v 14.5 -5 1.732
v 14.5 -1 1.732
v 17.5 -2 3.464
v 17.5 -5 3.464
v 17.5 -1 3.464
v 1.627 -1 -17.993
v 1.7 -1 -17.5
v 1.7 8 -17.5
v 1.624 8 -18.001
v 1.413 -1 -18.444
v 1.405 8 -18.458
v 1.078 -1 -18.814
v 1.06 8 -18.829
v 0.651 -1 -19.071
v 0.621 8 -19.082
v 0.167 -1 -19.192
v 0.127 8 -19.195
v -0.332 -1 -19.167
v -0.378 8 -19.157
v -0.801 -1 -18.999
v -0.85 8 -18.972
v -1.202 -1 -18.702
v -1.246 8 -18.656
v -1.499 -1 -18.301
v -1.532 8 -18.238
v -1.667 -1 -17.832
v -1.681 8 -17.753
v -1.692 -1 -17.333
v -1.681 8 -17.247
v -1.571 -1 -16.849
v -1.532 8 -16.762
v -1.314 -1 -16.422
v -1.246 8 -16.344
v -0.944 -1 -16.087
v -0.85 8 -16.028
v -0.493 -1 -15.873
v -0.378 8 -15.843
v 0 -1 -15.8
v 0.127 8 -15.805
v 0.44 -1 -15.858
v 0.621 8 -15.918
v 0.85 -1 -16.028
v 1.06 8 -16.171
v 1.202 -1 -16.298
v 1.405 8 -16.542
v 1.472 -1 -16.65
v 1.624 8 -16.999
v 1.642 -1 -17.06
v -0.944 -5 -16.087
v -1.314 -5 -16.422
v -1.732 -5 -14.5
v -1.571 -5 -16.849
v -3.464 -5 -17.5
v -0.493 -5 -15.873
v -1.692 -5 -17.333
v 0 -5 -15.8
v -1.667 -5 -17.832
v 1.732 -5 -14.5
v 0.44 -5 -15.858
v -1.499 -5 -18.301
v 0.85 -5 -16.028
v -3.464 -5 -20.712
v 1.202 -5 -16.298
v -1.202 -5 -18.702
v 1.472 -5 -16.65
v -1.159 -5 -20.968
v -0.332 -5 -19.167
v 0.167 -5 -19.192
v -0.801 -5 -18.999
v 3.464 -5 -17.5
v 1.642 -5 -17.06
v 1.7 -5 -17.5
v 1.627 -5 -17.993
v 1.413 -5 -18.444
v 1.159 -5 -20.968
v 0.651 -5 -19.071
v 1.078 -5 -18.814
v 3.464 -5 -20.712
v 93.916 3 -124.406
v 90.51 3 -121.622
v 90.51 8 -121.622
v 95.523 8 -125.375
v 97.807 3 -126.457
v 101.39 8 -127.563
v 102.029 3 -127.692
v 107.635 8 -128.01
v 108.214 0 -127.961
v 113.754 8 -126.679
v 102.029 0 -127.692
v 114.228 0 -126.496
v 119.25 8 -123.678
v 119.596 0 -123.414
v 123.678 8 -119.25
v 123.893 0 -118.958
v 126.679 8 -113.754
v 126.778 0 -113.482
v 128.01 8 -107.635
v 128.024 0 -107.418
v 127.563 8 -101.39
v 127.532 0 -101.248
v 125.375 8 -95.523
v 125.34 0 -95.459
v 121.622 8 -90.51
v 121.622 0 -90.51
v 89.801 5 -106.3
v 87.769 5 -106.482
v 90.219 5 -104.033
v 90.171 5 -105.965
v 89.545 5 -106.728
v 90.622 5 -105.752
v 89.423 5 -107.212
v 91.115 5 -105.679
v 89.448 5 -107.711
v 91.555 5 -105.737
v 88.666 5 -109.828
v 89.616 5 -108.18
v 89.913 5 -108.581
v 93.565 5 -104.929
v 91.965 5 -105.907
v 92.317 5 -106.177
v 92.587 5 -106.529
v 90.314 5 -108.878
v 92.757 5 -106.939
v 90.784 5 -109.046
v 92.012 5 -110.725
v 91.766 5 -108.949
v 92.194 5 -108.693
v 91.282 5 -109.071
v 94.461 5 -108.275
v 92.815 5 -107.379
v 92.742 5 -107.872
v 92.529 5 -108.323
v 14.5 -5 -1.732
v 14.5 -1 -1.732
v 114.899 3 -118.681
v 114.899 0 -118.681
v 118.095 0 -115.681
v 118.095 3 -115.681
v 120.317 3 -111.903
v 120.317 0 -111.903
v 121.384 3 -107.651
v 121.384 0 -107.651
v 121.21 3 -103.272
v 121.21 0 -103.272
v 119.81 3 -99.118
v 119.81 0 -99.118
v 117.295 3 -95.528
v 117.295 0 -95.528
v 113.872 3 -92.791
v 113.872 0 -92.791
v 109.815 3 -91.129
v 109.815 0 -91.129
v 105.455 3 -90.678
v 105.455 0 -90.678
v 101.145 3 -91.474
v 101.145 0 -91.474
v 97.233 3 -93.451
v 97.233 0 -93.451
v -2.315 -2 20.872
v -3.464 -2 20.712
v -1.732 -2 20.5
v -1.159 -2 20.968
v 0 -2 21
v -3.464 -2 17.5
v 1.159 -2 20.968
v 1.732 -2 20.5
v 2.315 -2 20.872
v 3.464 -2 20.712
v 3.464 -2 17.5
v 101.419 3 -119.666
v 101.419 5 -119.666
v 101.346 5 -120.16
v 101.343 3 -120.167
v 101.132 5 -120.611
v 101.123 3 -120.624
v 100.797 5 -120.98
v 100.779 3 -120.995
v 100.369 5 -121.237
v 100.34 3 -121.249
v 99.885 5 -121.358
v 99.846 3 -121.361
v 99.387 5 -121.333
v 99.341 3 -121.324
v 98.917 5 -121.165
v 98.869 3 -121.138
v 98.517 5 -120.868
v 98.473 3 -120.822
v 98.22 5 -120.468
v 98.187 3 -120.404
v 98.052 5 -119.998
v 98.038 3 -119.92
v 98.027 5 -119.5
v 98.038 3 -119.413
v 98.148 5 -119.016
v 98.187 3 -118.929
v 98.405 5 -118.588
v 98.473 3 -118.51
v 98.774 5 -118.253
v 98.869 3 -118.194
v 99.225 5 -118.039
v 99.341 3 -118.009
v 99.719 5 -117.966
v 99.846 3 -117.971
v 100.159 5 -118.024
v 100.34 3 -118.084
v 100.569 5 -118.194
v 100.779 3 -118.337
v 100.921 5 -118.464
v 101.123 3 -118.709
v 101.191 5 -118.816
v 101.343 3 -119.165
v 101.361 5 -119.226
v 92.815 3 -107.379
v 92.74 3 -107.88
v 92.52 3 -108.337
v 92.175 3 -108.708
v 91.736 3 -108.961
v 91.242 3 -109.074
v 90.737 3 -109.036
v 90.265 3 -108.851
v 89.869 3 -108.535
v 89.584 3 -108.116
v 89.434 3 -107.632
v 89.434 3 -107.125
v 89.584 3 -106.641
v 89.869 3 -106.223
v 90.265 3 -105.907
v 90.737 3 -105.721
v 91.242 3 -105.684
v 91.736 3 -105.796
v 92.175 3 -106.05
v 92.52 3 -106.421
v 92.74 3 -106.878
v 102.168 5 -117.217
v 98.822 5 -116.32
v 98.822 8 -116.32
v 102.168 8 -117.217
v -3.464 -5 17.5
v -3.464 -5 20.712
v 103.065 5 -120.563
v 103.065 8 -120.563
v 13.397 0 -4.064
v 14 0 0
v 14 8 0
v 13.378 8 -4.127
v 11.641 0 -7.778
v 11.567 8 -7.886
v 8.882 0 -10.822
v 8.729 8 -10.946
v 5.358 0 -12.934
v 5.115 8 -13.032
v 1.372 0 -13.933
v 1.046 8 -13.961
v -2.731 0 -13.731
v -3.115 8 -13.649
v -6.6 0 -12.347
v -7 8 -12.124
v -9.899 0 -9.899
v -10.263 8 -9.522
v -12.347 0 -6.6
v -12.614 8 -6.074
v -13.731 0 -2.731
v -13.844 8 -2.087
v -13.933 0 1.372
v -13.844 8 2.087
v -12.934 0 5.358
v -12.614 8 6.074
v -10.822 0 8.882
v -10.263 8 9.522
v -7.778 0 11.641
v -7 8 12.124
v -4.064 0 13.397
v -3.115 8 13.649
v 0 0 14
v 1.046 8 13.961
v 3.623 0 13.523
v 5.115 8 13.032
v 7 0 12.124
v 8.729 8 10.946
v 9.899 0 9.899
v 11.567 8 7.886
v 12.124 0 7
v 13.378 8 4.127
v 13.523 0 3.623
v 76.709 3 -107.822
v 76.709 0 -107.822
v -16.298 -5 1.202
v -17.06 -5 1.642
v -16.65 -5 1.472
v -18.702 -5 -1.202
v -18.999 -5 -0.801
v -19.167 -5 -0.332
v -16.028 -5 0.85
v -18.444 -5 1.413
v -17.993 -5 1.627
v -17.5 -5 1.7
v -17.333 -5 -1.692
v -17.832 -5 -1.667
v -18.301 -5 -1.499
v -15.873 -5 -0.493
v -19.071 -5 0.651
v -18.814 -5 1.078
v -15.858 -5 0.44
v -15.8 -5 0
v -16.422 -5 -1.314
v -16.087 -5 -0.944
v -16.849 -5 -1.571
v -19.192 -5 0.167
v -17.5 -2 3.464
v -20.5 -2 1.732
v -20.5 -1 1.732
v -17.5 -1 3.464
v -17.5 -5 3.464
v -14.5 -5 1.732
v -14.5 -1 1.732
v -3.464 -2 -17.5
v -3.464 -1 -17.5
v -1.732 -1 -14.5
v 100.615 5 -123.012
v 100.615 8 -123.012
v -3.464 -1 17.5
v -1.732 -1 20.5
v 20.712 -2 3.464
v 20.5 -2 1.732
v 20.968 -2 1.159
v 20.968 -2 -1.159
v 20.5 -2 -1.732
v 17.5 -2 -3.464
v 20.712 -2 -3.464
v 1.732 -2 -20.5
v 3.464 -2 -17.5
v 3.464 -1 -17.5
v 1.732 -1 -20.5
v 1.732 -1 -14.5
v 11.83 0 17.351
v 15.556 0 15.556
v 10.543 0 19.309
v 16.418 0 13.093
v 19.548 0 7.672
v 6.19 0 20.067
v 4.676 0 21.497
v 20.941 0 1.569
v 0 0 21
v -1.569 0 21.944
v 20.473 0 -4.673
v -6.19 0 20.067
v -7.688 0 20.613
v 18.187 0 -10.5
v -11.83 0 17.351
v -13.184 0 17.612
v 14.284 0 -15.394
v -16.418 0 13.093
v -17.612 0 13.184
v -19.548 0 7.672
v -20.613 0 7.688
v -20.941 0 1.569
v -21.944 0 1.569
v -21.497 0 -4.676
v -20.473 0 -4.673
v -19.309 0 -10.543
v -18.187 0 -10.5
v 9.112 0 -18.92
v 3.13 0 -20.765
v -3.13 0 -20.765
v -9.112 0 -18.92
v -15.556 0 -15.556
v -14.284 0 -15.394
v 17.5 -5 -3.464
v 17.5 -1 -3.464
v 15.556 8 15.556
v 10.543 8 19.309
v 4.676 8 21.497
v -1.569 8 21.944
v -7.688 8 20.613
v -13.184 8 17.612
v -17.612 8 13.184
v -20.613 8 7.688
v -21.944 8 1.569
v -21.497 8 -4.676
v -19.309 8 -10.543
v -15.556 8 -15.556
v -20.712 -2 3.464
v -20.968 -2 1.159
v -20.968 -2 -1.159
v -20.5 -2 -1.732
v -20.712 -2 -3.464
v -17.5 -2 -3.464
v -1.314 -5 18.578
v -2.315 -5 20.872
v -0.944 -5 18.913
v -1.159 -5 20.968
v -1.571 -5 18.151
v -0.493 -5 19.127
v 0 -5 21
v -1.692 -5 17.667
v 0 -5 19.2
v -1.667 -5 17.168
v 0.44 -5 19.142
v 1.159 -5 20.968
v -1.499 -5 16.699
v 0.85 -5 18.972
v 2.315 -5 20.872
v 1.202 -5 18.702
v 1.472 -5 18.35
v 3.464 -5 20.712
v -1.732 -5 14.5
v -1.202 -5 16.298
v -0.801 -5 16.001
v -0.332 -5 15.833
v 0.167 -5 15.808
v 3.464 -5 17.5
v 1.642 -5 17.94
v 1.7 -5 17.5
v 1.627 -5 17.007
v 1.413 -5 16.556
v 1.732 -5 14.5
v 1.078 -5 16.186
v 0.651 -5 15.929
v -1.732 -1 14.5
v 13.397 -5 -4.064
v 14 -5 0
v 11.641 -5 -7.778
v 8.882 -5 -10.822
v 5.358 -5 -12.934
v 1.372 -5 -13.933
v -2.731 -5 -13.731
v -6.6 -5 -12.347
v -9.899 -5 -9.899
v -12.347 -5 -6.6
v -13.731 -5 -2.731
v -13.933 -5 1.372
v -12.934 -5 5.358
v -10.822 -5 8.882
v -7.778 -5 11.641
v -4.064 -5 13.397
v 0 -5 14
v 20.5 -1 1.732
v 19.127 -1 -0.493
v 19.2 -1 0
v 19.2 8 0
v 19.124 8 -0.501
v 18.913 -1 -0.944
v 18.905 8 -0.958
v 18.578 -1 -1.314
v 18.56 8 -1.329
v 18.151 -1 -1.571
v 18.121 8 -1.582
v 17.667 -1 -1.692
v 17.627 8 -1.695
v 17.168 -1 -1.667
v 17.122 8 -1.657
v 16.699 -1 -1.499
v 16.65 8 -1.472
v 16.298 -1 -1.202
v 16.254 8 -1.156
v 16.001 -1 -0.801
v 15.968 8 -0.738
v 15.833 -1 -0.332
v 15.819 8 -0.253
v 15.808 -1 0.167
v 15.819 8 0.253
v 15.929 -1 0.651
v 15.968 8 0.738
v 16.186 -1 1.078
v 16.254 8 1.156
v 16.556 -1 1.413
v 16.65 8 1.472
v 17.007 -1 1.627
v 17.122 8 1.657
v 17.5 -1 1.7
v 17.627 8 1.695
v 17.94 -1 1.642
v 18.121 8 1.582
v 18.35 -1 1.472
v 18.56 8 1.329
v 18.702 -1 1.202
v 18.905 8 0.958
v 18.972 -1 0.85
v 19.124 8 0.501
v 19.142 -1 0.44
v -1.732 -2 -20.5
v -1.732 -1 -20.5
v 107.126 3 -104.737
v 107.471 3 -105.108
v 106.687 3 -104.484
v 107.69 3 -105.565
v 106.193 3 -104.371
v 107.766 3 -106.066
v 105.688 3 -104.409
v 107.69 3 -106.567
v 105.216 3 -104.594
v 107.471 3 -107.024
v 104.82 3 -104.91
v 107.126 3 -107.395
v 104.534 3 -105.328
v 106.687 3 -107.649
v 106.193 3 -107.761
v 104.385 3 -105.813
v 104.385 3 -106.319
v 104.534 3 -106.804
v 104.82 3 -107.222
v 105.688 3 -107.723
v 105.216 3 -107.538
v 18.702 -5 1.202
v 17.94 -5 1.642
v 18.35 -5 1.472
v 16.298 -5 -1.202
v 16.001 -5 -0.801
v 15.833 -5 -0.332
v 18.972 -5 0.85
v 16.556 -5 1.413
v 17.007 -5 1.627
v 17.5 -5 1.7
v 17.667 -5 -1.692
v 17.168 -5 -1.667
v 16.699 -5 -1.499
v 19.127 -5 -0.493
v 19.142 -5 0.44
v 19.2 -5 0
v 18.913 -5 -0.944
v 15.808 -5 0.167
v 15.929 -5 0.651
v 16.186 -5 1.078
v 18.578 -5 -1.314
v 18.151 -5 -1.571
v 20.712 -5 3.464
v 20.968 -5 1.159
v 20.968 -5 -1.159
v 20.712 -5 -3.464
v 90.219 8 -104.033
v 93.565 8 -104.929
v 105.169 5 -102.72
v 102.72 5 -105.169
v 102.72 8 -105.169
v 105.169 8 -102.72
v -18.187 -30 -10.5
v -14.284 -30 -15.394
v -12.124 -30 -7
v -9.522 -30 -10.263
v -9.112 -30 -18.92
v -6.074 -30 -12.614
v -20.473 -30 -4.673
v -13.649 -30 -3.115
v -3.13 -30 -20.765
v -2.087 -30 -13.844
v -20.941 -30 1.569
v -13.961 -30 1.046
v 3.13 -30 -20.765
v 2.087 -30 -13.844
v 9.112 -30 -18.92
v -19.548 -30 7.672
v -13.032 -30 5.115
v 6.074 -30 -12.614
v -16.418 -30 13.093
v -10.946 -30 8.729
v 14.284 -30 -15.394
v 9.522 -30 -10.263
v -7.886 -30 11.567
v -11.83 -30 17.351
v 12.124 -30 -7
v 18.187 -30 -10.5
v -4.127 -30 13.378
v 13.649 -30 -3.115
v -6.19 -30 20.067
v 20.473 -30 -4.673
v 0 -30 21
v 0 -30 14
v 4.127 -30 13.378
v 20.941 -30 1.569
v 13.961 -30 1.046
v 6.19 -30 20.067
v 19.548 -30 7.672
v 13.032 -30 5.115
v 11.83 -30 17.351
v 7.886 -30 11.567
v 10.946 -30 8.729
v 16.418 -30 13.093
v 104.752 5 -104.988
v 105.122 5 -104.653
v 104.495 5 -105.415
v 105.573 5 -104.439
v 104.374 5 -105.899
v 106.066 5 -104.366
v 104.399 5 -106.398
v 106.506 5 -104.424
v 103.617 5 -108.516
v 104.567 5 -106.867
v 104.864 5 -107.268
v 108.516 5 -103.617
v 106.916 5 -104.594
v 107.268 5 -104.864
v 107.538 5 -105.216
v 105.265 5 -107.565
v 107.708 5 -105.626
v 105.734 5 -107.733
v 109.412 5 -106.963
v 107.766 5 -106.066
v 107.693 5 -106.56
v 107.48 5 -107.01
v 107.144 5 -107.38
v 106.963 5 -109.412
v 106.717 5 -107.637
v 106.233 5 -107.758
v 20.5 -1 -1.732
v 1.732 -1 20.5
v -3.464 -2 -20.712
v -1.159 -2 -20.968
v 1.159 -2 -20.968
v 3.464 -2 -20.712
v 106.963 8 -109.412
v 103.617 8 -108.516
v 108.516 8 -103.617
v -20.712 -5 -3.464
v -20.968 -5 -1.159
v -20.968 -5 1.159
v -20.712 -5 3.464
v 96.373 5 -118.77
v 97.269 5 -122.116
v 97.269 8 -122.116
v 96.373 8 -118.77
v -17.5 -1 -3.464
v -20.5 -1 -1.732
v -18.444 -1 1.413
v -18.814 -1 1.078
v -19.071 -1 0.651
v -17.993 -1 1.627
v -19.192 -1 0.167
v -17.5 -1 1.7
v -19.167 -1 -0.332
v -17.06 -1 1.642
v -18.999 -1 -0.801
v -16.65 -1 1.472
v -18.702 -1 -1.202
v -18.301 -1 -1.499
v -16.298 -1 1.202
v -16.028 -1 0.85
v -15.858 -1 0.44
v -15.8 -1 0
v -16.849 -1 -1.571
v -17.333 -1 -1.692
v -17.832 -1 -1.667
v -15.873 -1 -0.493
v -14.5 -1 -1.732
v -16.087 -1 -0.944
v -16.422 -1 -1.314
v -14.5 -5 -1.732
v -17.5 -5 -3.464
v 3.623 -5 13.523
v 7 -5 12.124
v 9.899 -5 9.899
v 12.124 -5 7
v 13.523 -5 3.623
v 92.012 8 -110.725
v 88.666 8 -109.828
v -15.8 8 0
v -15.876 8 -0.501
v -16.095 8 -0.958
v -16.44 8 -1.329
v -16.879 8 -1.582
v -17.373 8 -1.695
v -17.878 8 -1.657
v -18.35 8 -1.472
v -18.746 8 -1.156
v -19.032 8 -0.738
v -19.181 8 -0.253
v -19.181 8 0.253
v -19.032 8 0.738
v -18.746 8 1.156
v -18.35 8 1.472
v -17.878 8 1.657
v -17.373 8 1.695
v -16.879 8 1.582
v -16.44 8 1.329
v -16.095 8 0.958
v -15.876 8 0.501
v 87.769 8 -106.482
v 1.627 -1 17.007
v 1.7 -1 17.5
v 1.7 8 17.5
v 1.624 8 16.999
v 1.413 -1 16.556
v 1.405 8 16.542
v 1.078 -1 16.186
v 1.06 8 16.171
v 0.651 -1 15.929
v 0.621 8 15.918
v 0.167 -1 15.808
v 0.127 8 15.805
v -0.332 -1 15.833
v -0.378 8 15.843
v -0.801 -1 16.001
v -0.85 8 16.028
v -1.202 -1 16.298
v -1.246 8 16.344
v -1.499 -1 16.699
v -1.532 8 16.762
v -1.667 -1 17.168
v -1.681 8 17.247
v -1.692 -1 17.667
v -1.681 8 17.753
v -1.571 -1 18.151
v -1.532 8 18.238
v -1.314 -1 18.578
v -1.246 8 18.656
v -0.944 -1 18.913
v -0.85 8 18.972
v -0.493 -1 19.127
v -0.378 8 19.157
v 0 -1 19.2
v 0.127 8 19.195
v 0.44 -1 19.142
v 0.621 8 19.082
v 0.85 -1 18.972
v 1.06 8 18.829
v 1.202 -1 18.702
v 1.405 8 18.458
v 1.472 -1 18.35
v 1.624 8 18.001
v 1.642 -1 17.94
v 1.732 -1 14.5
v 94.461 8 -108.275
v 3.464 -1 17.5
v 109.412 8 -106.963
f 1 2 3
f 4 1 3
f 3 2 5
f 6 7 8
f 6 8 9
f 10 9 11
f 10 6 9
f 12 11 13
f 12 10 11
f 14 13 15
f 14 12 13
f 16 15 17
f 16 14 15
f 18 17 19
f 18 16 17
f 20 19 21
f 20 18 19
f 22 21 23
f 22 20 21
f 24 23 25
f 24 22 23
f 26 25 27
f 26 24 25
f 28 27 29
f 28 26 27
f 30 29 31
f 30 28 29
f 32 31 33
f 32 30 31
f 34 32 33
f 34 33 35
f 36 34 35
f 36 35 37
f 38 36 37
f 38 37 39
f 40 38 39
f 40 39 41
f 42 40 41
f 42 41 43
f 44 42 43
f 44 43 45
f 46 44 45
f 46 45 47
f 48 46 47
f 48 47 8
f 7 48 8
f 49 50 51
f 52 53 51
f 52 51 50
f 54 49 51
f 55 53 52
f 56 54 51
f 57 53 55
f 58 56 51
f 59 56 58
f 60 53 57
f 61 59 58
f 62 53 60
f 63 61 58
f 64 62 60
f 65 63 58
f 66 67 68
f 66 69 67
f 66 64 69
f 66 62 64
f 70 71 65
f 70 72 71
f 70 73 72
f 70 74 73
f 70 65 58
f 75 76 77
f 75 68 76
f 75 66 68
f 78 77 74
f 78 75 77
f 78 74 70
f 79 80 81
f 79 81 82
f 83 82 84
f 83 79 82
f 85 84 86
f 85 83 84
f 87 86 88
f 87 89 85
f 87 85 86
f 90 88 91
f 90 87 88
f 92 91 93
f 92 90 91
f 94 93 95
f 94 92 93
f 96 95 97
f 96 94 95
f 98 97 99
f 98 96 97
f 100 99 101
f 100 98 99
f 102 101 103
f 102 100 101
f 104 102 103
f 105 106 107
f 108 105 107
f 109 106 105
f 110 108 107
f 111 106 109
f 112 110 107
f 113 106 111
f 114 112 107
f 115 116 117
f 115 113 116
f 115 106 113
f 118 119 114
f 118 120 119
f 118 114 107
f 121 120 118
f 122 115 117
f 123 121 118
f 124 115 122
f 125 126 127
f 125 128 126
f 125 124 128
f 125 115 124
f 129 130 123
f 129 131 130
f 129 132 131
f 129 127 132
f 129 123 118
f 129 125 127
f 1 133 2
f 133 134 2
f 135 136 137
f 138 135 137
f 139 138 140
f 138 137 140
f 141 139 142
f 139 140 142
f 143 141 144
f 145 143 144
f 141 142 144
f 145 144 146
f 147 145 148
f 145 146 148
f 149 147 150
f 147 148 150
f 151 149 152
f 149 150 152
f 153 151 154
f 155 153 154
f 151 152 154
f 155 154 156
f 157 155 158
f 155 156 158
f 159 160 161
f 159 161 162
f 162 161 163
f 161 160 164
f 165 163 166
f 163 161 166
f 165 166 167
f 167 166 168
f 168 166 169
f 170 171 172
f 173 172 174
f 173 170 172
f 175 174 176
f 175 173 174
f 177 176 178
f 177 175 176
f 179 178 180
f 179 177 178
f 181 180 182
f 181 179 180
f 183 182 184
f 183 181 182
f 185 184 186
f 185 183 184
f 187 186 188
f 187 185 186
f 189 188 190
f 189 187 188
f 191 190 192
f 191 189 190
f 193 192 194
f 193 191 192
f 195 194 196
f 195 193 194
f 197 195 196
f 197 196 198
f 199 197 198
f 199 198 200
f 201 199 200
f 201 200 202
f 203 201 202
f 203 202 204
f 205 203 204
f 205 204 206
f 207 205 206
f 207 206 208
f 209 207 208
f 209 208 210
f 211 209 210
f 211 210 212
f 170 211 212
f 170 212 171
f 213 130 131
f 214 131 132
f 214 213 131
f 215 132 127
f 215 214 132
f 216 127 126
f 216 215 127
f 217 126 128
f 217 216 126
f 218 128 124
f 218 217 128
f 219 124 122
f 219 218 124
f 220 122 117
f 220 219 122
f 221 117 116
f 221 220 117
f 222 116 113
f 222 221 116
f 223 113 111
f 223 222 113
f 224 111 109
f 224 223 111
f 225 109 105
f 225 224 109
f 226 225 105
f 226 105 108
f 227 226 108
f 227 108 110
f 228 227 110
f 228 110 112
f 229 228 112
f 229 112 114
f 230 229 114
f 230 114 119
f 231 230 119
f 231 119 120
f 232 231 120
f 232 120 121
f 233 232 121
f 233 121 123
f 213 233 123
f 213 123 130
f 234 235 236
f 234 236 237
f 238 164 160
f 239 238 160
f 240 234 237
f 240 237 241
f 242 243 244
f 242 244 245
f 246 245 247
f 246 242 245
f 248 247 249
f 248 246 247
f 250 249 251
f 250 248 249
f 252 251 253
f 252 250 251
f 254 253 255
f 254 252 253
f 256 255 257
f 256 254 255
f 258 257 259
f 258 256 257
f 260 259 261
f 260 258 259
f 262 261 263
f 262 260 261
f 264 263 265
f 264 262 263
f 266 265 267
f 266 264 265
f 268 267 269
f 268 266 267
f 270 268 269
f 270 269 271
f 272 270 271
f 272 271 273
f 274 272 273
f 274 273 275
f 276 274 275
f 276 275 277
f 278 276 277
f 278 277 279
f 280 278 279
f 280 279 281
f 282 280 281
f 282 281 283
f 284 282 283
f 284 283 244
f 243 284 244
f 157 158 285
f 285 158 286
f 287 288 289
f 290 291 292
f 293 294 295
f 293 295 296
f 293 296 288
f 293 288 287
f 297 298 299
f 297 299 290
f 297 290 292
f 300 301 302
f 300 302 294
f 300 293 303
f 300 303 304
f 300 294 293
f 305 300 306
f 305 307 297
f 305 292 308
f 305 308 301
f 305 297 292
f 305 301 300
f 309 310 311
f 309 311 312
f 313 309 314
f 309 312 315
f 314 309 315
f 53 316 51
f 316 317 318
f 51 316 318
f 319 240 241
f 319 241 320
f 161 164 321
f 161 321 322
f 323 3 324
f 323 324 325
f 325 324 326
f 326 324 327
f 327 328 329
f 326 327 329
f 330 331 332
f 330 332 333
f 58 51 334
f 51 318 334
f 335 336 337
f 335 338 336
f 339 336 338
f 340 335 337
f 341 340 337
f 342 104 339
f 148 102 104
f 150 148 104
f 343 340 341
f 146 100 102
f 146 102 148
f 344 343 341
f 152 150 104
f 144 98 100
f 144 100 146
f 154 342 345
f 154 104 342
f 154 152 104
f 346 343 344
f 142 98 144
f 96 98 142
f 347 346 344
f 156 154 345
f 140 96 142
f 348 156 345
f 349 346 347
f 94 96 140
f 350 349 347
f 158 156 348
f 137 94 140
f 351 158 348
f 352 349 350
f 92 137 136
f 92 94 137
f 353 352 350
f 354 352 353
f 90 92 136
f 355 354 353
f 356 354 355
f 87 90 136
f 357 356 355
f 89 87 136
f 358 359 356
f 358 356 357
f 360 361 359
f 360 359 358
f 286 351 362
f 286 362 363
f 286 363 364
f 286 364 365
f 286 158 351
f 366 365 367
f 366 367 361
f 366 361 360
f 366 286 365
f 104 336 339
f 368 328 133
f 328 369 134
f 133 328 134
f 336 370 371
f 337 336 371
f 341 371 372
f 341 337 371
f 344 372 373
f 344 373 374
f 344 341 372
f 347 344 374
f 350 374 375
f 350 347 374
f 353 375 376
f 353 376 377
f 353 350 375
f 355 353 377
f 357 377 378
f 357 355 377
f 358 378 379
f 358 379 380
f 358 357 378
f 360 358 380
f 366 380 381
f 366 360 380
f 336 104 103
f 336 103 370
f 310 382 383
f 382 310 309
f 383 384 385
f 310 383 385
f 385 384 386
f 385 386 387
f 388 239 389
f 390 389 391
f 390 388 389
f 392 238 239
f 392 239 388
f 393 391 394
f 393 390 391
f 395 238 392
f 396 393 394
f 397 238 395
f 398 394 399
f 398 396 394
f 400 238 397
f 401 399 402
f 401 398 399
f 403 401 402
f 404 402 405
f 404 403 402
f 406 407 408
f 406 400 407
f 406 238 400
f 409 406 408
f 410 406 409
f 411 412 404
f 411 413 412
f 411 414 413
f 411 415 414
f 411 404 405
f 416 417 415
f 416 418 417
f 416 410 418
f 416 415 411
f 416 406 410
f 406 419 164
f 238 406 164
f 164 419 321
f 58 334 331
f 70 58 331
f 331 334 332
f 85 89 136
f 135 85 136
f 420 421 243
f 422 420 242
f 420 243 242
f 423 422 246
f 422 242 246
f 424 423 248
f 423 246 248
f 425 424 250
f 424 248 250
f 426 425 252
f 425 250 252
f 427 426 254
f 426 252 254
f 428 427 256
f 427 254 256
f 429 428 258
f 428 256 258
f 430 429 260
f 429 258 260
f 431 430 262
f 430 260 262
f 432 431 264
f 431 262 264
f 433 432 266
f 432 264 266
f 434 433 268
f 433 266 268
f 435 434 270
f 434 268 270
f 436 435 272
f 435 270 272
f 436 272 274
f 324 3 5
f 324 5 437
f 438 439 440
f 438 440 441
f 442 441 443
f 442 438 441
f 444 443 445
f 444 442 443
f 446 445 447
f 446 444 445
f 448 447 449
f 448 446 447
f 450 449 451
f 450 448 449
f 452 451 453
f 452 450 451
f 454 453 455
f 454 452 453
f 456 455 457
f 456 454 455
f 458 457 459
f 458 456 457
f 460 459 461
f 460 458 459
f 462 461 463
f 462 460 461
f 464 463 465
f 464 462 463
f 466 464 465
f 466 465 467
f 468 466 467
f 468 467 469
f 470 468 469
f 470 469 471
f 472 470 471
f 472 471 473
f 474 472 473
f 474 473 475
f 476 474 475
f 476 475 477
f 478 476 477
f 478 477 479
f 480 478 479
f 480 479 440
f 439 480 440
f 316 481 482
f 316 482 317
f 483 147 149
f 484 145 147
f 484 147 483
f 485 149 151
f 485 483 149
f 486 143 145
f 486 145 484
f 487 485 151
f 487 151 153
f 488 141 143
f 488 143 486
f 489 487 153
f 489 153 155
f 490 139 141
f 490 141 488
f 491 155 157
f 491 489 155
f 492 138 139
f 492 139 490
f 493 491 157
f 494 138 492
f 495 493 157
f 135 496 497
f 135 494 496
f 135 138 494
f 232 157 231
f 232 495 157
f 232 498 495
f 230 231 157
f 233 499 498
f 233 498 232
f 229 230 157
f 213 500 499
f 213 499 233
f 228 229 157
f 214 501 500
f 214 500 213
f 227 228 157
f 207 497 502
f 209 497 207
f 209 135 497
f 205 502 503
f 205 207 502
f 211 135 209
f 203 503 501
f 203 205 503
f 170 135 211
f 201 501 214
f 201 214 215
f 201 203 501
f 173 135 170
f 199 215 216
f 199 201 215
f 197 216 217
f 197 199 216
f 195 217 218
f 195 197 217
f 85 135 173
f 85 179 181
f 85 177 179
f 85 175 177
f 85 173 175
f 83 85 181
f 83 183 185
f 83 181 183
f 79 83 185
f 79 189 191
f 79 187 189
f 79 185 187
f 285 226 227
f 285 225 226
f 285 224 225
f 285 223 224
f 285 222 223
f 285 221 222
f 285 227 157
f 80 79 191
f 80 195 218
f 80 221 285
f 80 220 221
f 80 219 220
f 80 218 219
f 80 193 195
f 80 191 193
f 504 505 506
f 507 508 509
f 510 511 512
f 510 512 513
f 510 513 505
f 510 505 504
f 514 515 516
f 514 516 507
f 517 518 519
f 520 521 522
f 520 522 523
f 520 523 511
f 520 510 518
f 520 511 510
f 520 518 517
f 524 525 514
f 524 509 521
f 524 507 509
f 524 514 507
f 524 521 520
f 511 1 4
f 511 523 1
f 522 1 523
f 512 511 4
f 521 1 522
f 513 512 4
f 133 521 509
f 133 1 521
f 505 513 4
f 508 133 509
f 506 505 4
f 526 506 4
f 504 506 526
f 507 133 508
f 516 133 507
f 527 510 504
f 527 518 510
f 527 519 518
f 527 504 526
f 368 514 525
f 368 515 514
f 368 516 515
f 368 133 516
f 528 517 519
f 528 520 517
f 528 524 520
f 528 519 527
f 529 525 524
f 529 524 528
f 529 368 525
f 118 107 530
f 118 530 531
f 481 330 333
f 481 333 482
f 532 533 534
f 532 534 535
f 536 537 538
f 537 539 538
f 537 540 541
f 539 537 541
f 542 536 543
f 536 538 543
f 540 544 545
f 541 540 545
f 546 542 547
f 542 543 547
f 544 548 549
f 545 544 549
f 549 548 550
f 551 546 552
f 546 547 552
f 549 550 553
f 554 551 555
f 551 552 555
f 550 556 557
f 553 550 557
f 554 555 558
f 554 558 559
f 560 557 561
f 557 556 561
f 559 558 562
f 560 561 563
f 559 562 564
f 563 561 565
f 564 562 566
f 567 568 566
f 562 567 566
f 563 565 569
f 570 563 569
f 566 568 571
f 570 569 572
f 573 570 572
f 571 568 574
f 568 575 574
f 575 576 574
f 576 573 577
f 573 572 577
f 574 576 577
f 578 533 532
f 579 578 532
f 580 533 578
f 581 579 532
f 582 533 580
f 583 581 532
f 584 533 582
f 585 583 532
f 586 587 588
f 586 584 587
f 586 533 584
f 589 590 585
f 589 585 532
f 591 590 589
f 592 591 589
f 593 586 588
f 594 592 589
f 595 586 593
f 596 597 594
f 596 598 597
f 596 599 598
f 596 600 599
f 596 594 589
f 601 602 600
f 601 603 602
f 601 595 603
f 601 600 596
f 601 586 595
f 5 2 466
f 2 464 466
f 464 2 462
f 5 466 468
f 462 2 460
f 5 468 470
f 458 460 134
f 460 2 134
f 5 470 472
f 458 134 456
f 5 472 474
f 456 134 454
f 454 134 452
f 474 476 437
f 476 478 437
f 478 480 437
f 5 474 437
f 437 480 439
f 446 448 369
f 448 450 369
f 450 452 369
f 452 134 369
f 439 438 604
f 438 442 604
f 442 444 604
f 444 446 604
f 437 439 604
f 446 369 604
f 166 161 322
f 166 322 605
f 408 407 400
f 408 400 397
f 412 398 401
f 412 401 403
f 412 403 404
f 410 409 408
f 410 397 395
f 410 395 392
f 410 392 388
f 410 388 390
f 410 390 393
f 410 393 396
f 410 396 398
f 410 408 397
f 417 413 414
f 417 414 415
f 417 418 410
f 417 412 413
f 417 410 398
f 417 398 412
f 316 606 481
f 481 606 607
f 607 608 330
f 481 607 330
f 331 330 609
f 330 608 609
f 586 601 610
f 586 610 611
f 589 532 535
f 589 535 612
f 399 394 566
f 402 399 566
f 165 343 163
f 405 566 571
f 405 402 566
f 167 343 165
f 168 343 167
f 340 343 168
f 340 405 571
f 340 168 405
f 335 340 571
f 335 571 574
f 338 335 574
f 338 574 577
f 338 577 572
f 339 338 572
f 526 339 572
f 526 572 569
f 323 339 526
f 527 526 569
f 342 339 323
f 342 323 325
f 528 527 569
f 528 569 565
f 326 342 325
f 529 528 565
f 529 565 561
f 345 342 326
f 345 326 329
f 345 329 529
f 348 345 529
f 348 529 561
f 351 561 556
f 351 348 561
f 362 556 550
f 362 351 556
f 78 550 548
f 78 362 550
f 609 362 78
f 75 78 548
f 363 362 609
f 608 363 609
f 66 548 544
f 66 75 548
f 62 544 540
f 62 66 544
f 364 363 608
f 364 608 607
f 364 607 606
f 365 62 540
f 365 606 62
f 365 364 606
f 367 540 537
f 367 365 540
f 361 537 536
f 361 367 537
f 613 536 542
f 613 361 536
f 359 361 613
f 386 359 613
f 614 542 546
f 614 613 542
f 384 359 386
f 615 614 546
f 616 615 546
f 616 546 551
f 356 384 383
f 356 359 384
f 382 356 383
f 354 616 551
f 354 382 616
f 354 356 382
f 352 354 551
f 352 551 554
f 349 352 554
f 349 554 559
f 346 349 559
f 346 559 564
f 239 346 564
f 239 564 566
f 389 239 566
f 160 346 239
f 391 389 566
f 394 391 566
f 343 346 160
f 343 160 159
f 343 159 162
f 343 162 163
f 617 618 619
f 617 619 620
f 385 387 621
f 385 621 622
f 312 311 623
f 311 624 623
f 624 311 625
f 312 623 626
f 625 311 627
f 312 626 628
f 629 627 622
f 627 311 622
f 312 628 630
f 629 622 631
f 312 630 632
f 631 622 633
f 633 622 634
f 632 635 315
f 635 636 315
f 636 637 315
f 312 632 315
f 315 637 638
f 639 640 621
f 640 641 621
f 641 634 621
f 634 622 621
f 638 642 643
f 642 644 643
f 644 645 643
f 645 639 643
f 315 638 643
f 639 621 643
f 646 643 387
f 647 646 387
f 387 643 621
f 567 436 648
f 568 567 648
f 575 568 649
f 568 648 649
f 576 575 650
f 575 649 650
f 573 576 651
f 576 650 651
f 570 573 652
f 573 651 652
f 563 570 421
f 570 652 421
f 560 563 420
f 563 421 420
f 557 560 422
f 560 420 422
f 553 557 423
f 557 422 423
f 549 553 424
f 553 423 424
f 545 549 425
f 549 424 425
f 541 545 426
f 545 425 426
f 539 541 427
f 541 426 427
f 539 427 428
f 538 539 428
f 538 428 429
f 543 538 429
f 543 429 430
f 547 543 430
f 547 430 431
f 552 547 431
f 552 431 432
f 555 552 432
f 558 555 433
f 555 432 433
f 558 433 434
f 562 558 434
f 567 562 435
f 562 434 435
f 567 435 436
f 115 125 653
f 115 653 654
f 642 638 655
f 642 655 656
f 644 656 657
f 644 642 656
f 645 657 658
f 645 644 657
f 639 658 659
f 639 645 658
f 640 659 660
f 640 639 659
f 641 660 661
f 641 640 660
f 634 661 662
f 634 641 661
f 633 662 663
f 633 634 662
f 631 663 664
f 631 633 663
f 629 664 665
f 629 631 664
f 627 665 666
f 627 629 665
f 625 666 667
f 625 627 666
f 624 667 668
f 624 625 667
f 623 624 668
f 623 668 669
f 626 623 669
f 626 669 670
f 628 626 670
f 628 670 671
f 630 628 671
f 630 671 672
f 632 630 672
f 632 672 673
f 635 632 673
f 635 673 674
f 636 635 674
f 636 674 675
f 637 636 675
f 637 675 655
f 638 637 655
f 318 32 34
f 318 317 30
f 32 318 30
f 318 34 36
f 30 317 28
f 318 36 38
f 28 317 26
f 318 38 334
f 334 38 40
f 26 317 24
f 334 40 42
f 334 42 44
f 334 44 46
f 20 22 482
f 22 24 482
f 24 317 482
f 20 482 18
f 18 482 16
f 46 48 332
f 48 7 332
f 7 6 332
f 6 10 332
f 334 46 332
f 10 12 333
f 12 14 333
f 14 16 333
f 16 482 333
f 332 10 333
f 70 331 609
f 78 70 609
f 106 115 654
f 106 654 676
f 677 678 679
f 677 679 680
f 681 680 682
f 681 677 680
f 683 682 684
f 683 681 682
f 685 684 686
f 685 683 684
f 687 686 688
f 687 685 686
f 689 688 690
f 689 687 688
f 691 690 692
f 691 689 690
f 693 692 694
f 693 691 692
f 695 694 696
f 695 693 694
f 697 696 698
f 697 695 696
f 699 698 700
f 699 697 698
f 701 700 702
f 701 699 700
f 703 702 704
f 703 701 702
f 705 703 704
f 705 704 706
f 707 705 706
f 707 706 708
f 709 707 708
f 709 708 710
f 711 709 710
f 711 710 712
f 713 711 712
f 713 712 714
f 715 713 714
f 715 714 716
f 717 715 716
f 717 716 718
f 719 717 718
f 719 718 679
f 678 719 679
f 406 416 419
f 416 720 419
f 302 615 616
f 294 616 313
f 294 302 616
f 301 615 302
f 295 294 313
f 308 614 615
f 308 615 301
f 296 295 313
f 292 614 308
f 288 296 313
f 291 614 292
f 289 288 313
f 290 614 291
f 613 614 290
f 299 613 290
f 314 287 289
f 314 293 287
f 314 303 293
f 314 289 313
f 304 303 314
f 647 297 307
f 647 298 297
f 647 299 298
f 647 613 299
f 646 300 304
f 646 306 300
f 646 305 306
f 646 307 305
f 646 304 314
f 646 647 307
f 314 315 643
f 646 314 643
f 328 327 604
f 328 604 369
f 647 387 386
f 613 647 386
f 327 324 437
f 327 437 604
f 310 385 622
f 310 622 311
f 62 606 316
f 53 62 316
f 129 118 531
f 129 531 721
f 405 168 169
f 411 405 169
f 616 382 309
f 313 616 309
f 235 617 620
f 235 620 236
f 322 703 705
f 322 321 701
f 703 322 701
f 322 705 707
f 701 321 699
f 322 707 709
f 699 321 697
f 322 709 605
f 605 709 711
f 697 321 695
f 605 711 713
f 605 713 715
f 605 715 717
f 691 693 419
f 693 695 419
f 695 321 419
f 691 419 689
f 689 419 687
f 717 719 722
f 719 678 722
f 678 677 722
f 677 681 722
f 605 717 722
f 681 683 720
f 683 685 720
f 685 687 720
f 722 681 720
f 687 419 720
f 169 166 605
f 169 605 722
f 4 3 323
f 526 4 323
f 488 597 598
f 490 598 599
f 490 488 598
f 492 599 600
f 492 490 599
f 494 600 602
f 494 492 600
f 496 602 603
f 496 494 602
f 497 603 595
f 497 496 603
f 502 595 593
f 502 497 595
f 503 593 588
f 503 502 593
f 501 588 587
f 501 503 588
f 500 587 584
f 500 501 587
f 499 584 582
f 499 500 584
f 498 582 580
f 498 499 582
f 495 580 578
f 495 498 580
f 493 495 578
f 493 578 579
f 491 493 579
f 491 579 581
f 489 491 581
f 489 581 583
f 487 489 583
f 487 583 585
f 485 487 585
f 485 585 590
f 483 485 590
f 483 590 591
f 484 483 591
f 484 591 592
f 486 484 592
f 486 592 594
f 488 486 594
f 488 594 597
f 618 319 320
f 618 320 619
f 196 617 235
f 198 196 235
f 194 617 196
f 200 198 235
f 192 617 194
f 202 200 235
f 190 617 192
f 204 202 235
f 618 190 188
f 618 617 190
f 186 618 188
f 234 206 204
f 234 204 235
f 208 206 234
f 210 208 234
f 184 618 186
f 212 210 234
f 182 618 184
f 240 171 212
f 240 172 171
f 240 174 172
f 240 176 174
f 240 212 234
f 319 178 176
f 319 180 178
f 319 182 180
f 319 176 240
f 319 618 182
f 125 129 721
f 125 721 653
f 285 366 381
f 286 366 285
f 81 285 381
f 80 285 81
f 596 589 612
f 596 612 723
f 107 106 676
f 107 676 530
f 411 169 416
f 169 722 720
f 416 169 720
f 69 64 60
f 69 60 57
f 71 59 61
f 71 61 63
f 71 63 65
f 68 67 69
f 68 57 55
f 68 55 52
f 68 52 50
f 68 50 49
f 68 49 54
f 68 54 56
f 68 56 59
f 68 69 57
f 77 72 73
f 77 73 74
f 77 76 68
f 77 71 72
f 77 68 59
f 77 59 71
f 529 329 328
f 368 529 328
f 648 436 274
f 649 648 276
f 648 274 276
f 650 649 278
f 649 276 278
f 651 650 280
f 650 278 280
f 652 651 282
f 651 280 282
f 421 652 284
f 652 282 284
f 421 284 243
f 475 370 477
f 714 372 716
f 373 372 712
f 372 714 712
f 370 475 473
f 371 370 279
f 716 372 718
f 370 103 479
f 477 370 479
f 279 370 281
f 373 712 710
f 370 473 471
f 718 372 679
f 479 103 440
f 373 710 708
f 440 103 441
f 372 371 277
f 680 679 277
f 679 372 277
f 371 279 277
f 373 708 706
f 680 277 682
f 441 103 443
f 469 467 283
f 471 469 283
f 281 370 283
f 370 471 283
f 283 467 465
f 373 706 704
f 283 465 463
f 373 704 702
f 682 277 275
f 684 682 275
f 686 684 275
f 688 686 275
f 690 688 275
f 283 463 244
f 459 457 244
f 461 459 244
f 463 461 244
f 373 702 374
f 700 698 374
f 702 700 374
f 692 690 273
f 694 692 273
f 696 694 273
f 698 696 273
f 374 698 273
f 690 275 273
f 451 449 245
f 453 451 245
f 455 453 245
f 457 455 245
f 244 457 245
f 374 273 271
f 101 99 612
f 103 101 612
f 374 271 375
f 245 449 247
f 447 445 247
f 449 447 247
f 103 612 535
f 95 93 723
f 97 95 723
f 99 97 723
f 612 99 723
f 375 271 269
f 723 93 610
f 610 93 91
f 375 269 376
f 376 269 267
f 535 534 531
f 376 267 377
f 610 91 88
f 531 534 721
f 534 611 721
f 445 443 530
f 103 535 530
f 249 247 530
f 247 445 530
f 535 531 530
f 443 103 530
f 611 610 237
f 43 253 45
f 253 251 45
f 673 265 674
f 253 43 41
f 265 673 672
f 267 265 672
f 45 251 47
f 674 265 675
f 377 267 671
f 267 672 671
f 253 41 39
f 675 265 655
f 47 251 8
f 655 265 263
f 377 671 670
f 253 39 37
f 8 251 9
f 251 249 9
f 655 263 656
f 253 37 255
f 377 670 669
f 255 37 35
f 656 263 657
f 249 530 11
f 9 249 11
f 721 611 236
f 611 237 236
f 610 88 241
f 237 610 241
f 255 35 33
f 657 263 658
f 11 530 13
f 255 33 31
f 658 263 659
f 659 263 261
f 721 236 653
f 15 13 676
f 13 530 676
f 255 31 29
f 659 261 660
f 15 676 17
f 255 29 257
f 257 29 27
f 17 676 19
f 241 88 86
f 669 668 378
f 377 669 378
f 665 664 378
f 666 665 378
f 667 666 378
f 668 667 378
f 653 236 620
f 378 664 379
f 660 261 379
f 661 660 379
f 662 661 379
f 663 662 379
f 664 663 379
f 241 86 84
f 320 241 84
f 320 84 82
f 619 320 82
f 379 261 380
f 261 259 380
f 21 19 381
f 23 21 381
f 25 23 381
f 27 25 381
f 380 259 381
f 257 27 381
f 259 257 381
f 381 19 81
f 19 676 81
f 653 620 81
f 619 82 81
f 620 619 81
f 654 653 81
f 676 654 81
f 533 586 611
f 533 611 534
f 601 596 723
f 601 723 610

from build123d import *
from build123d.topology import SkipClean

# Parameters (mm, degrees)
BOSS_EXTRUDE1_DEPTH      = 8
SKETCH1_4_R              = 21
SKETCH1_4_R_2            = 14
BOSS_EXTRUDE2_DEPTH      = 30
CUT_EXTRUDE3_START       = -2
SKETCH1_6_R              = 1.7
CUT_EXTRUDE3_DEPTH       = 3
CUT_EXTRUDE4_START       = -2
SKETCH1_7_R              = 1.7
CUT_EXTRUDE4_DEPTH       = 1
CUT_EXTRUDE2_START       = -5
CUT_EXTRUDE2_OUTLINE_R   = 14
CUT_EXTRUDE2_OUTLINE_R_2 = 1.7
CUT_EXTRUDE2_DEPTH       = 13
CUT_EXTRUDE5_START       = 5
SKETCH1_8_R              = 1.7
CUT_EXTRUDE5_DEPTH       = 3
CUT_EXTRUDE6_DEPTH       = 3


# Read off the part's stored shape, not the designer's step: Cut-Extrude2
with BuildPart() as part:
    # Sketch1 → Boss-Extrude1 (new body)
    with BuildSketch(Plane(origin=(0, 0, 0), x_dir=(1, 0, 0), z_dir=(0, 1, 0))):
        with BuildLine():
            Line((-15.556349186, 15.556349186), (90.509667992, 121.622366364))
            ThreePointArc((90.509667992, 121.622366364), (121.622366364, 121.622366364), (121.622366364, 90.509667992))
            Line((121.622366364, 90.509667992), (15.556349186, -15.556349186))
            ThreePointArc((15.556349186, -15.556349186), (-15.556349186, -15.556349186), (-15.556349186, 15.556349186))
        make_face()
    extrude(amount=BOSS_EXTRUDE1_DEPTH)

    # Sketch1<4> → Boss-Extrude2 (add)
    with BuildSketch(Plane(origin=(0, 0, 0), x_dir=(1, 0, 0), z_dir=(0, 1, 0))):
        with Locations(Location((0, 0, 0), (0, 0, 270))):
            Circle(SKETCH1_4_R)
        with Locations(Location((0, 0, 0), (0, 0, 270))):
            Circle(SKETCH1_4_R_2, mode=Mode.SUBTRACT)
    extrude(amount=-BOSS_EXTRUDE2_DEPTH)

    # Sketch1<6> → Cut-Extrude3 (cut)
    # profile 1 of 4: a face of its own
    with BuildSketch(Plane(origin=(0, 0, 0), x_dir=(1, 0, 0), z_dir=(0, 1, 0)).offset(CUT_EXTRUDE3_START)):
        with BuildLine():
            Line((-3.464101615, 17.5), (-1.732050808, 14.5))
            Line((-1.732050808, 14.5), (1.732050808, 14.5))
            Line((1.732050808, 14.5), (3.464101615, 17.5))
            Line((3.464101615, 17.5), (3.464101615, 20.712315177))
            ThreePointArc((3.464101615, 20.712315177), (0, 21), (-3.464101615, 20.712315177))
            Line((-3.464101615, 20.712315177), (-3.464101615, 17.5))
        make_face()
        with Locations(Location((0, 17.5, 0), (0, 0, 270))):
            Circle(SKETCH1_6_R, mode=Mode.SUBTRACT)
    # profile 2 of 4: a face of its own
    with BuildSketch(Plane(origin=(0, 0, 0), x_dir=(1, 0, 0), z_dir=(0, 1, 0)).offset(CUT_EXTRUDE3_START)):
        with BuildLine():
            ThreePointArc((20.712315177, -3.464101615), (21, 0), (20.712315177, 3.464101615))
            Line((20.712315177, 3.464101615), (17.5, 3.464101615))
            Line((17.5, 3.464101615), (14.5, 1.732050808))
            Line((14.5, 1.732050808), (14.5, -1.732050808))
            Line((14.5, -1.732050808), (17.5, -3.464101615))
            Line((17.5, -3.464101615), (20.712315177, -3.464101615))
        make_face()
        with Locations(Location((17.5, 0, 0), (0, 0, 270))):
            Circle(SKETCH1_6_R, mode=Mode.SUBTRACT)
    # profile 3 of 4: a face of its own
    with BuildSketch(Plane(origin=(0, 0, 0), x_dir=(1, 0, 0), z_dir=(0, 1, 0)).offset(CUT_EXTRUDE3_START)):
        with BuildLine():
            Line((-17.5, 3.464101615), (-20.712315177, 3.464101615))
            ThreePointArc((-20.712315177, 3.464101615), (-21, 0), (-20.712315177, -3.464101615))
            Line((-20.712315177, -3.464101615), (-17.5, -3.464101615))
            Line((-17.5, -3.464101615), (-14.5, -1.732050808))
            Line((-14.5, -1.732050808), (-14.5, 1.732050808))
            Line((-14.5, 1.732050808), (-17.5, 3.464101615))
        make_face()
        with Locations(Location((-17.5, 0, 0), (0, 0, 270))):
            Circle(SKETCH1_6_R, mode=Mode.SUBTRACT)
    # profile 4 of 4: a face of its own
    with BuildSketch(Plane(origin=(0, 0, 0), x_dir=(1, 0, 0), z_dir=(0, 1, 0)).offset(CUT_EXTRUDE3_START)):
        with BuildLine():
            ThreePointArc((-3.464101615, -20.712315177), (0, -21), (3.464101615, -20.712315177))
            Line((3.464101615, -20.712315177), (3.464101615, -17.5))
            Line((3.464101615, -17.5), (1.732050808, -14.5))
            Line((1.732050808, -14.5), (-1.732050808, -14.5))
            Line((-1.732050808, -14.5), (-3.464101615, -17.5))
            Line((-3.464101615, -17.5), (-3.464101615, -20.712315177))
        make_face()
        with Locations(Location((0, -17.5, 0), (0, 0, 270))):
            Circle(SKETCH1_6_R, mode=Mode.SUBTRACT)
    extrude(amount=-CUT_EXTRUDE3_DEPTH, mode=Mode.SUBTRACT)

    # Sketch1<7> → Cut-Extrude4 (cut)
    # profile 1 of 4: a face of its own
    with BuildSketch(Plane(origin=(0, 0, 0), x_dir=(1, 0, 0), z_dir=(0, 1, 0)).offset(CUT_EXTRUDE4_START)):
        Polygon((-1.732050808, 20.5), (-3.464101615, 17.5), (-1.732050808, 14.5), (1.732050808, 14.5), (3.464101615, 17.5), (1.732050808, 20.5), align=None)
        with Locations(Location((0, 17.5, 0), (0, 0, 270))):
            Circle(SKETCH1_7_R, mode=Mode.SUBTRACT)
    # profile 2 of 4: a face of its own
    with BuildSketch(Plane(origin=(0, 0, 0), x_dir=(1, 0, 0), z_dir=(0, 1, 0)).offset(CUT_EXTRUDE4_START)):
        Polygon((14.5, -1.732050808), (17.5, -3.464101615), (20.5, -1.732050808), (20.5, 1.732050808), (17.5, 3.464101615), (14.5, 1.732050808), align=None)
        with Locations(Location((17.5, 0, 0), (0, 0, 270))):
            Circle(SKETCH1_7_R, mode=Mode.SUBTRACT)
    # profile 3 of 4: a face of its own
    with BuildSketch(Plane(origin=(0, 0, 0), x_dir=(1, 0, 0), z_dir=(0, 1, 0)).offset(CUT_EXTRUDE4_START)):
        Polygon((-20.5, -1.732050808), (-17.5, -3.464101615), (-14.5, -1.732050808), (-14.5, 1.732050808), (-17.5, 3.464101615), (-20.5, 1.732050808), align=None)
        with Locations(Location((-17.5, 0, 0), (0, 0, 270))):
            Circle(SKETCH1_7_R, mode=Mode.SUBTRACT)
    # profile 4 of 4: a face of its own
    with BuildSketch(Plane(origin=(0, 0, 0), x_dir=(1, 0, 0), z_dir=(0, 1, 0)).offset(CUT_EXTRUDE4_START)):
        Polygon((-1.732050808, -14.5), (-3.464101615, -17.5), (-1.732050808, -20.5), (1.732050808, -20.5), (3.464101615, -17.5), (1.732050808, -14.5), align=None)
        with Locations(Location((0, -17.5, 0), (0, 0, 270))):
            Circle(SKETCH1_7_R, mode=Mode.SUBTRACT)
    extrude(amount=CUT_EXTRUDE4_DEPTH, mode=Mode.SUBTRACT)

    # Cut-Extrude2 outline → Cut-Extrude2 (cut)
    with SkipClean():  # the faces are left unmerged after this step: merging them gives an invalid solid
        with BuildSketch(Plane(origin=(0, 0, 0), x_dir=(1, 0, 0), z_dir=(0, 1, 0)).offset(CUT_EXTRUDE2_START)):
            Circle(CUT_EXTRUDE2_OUTLINE_R)
            with Locations((-17.5, 0)):
                Circle(CUT_EXTRUDE2_OUTLINE_R_2)
            with Locations((0, -17.5)):
                Circle(CUT_EXTRUDE2_OUTLINE_R_2)
            with Locations((17.5, 0)):
                Circle(CUT_EXTRUDE2_OUTLINE_R_2)
            with Locations((0, 17.5)):
                Circle(CUT_EXTRUDE2_OUTLINE_R_2)
            with Locations((99.718863875, 119.666151183)):
                Circle(CUT_EXTRUDE2_OUTLINE_R_2)
            with Locations((106.066017178, 106.066017178)):
                Circle(CUT_EXTRUDE2_OUTLINE_R_2)
            with Locations((91.11521733, 107.378870518)):
                Circle(CUT_EXTRUDE2_OUTLINE_R_2)
        extrude(amount=CUT_EXTRUDE2_DEPTH, mode=Mode.SUBTRACT)

    # Sketch1<8> → Cut-Extrude5 (cut)
    # profile 1 of 3: a face of its own
    with SkipClean():  # the faces are left unmerged after this step: merging them gives an invalid solid
        with BuildSketch(Plane(origin=(0, 0, 0), x_dir=(1, 0, 0), z_dir=(0, 1, 0)).offset(CUT_EXTRUDE5_START)):
            Polygon((102.168353618, 117.21666144), (103.06492909, 120.562726655), (100.615439347, 123.012216398), (97.269374132, 122.115640925), (96.37279866, 118.769575711), (98.822288403, 116.320085968), align=None)
            with Locations(Location((99.718863875, 119.666151183, 0), (0, 0, 270))):
                Circle(SKETCH1_8_R, mode=Mode.SUBTRACT)
        # profile 2 of 3: a face of its own
        with BuildSketch(Plane(origin=(0, 0, 0), x_dir=(1, 0, 0), z_dir=(0, 1, 0)).offset(CUT_EXTRUDE5_START)):
            Polygon((88.665727587, 109.828360261), (87.769152115, 106.482295046), (90.218641857, 104.032805303), (93.564707072, 104.929380776), (94.461282545, 108.275445991), (92.011792802, 110.724935733), align=None)
            with Locations(Location((91.11521733, 107.378870518, 0), (0, 0, 270))):
                Circle(SKETCH1_8_R, mode=Mode.SUBTRACT)
        # profile 3 of 3: a face of its own
        with BuildSketch(Plane(origin=(0, 0, 0), x_dir=(1, 0, 0), z_dir=(0, 1, 0)).offset(CUT_EXTRUDE5_START)):
            Polygon((108.515506921, 103.616527435), (109.412082393, 106.96259265), (106.96259265, 109.412082393), (103.616527435, 108.515506921), (102.719951963, 105.169441706), (105.169441706, 102.719951963), align=None)
            with Locations(Location((106.066017178, 106.066017178, 0), (0, 0, 270))):
                Circle(SKETCH1_8_R, mode=Mode.SUBTRACT)
        extrude(amount=CUT_EXTRUDE5_DEPTH, mode=Mode.SUBTRACT)

    # Sketch1<9> → Cut-Extrude6 (cut)
    with SkipClean():  # the faces are left unmerged after this step: merging them gives an invalid solid
        with BuildSketch(Plane(origin=(0, 0, 0), x_dir=(1, 0, 0), z_dir=(0, 1, 0))):
            with BuildLine():
                Line((97.232940058, 93.451075696), (-9.918409797, 168.479258594))
                ThreePointArc((-9.918409797, 168.479258594), (-13.700274159, 189.927277196), (7.747744443, 193.709141558))
                Line((7.747744443, 193.709141558), (114.899094298, 118.68095866))
                ThreePointArc((114.899094298, 118.68095866), (118.68095866, 97.232940058), (97.232940058, 93.451075696))
            make_face()
        extrude(amount=CUT_EXTRUDE6_DEPTH, mode=Mode.SUBTRACT)


solid = part.part
